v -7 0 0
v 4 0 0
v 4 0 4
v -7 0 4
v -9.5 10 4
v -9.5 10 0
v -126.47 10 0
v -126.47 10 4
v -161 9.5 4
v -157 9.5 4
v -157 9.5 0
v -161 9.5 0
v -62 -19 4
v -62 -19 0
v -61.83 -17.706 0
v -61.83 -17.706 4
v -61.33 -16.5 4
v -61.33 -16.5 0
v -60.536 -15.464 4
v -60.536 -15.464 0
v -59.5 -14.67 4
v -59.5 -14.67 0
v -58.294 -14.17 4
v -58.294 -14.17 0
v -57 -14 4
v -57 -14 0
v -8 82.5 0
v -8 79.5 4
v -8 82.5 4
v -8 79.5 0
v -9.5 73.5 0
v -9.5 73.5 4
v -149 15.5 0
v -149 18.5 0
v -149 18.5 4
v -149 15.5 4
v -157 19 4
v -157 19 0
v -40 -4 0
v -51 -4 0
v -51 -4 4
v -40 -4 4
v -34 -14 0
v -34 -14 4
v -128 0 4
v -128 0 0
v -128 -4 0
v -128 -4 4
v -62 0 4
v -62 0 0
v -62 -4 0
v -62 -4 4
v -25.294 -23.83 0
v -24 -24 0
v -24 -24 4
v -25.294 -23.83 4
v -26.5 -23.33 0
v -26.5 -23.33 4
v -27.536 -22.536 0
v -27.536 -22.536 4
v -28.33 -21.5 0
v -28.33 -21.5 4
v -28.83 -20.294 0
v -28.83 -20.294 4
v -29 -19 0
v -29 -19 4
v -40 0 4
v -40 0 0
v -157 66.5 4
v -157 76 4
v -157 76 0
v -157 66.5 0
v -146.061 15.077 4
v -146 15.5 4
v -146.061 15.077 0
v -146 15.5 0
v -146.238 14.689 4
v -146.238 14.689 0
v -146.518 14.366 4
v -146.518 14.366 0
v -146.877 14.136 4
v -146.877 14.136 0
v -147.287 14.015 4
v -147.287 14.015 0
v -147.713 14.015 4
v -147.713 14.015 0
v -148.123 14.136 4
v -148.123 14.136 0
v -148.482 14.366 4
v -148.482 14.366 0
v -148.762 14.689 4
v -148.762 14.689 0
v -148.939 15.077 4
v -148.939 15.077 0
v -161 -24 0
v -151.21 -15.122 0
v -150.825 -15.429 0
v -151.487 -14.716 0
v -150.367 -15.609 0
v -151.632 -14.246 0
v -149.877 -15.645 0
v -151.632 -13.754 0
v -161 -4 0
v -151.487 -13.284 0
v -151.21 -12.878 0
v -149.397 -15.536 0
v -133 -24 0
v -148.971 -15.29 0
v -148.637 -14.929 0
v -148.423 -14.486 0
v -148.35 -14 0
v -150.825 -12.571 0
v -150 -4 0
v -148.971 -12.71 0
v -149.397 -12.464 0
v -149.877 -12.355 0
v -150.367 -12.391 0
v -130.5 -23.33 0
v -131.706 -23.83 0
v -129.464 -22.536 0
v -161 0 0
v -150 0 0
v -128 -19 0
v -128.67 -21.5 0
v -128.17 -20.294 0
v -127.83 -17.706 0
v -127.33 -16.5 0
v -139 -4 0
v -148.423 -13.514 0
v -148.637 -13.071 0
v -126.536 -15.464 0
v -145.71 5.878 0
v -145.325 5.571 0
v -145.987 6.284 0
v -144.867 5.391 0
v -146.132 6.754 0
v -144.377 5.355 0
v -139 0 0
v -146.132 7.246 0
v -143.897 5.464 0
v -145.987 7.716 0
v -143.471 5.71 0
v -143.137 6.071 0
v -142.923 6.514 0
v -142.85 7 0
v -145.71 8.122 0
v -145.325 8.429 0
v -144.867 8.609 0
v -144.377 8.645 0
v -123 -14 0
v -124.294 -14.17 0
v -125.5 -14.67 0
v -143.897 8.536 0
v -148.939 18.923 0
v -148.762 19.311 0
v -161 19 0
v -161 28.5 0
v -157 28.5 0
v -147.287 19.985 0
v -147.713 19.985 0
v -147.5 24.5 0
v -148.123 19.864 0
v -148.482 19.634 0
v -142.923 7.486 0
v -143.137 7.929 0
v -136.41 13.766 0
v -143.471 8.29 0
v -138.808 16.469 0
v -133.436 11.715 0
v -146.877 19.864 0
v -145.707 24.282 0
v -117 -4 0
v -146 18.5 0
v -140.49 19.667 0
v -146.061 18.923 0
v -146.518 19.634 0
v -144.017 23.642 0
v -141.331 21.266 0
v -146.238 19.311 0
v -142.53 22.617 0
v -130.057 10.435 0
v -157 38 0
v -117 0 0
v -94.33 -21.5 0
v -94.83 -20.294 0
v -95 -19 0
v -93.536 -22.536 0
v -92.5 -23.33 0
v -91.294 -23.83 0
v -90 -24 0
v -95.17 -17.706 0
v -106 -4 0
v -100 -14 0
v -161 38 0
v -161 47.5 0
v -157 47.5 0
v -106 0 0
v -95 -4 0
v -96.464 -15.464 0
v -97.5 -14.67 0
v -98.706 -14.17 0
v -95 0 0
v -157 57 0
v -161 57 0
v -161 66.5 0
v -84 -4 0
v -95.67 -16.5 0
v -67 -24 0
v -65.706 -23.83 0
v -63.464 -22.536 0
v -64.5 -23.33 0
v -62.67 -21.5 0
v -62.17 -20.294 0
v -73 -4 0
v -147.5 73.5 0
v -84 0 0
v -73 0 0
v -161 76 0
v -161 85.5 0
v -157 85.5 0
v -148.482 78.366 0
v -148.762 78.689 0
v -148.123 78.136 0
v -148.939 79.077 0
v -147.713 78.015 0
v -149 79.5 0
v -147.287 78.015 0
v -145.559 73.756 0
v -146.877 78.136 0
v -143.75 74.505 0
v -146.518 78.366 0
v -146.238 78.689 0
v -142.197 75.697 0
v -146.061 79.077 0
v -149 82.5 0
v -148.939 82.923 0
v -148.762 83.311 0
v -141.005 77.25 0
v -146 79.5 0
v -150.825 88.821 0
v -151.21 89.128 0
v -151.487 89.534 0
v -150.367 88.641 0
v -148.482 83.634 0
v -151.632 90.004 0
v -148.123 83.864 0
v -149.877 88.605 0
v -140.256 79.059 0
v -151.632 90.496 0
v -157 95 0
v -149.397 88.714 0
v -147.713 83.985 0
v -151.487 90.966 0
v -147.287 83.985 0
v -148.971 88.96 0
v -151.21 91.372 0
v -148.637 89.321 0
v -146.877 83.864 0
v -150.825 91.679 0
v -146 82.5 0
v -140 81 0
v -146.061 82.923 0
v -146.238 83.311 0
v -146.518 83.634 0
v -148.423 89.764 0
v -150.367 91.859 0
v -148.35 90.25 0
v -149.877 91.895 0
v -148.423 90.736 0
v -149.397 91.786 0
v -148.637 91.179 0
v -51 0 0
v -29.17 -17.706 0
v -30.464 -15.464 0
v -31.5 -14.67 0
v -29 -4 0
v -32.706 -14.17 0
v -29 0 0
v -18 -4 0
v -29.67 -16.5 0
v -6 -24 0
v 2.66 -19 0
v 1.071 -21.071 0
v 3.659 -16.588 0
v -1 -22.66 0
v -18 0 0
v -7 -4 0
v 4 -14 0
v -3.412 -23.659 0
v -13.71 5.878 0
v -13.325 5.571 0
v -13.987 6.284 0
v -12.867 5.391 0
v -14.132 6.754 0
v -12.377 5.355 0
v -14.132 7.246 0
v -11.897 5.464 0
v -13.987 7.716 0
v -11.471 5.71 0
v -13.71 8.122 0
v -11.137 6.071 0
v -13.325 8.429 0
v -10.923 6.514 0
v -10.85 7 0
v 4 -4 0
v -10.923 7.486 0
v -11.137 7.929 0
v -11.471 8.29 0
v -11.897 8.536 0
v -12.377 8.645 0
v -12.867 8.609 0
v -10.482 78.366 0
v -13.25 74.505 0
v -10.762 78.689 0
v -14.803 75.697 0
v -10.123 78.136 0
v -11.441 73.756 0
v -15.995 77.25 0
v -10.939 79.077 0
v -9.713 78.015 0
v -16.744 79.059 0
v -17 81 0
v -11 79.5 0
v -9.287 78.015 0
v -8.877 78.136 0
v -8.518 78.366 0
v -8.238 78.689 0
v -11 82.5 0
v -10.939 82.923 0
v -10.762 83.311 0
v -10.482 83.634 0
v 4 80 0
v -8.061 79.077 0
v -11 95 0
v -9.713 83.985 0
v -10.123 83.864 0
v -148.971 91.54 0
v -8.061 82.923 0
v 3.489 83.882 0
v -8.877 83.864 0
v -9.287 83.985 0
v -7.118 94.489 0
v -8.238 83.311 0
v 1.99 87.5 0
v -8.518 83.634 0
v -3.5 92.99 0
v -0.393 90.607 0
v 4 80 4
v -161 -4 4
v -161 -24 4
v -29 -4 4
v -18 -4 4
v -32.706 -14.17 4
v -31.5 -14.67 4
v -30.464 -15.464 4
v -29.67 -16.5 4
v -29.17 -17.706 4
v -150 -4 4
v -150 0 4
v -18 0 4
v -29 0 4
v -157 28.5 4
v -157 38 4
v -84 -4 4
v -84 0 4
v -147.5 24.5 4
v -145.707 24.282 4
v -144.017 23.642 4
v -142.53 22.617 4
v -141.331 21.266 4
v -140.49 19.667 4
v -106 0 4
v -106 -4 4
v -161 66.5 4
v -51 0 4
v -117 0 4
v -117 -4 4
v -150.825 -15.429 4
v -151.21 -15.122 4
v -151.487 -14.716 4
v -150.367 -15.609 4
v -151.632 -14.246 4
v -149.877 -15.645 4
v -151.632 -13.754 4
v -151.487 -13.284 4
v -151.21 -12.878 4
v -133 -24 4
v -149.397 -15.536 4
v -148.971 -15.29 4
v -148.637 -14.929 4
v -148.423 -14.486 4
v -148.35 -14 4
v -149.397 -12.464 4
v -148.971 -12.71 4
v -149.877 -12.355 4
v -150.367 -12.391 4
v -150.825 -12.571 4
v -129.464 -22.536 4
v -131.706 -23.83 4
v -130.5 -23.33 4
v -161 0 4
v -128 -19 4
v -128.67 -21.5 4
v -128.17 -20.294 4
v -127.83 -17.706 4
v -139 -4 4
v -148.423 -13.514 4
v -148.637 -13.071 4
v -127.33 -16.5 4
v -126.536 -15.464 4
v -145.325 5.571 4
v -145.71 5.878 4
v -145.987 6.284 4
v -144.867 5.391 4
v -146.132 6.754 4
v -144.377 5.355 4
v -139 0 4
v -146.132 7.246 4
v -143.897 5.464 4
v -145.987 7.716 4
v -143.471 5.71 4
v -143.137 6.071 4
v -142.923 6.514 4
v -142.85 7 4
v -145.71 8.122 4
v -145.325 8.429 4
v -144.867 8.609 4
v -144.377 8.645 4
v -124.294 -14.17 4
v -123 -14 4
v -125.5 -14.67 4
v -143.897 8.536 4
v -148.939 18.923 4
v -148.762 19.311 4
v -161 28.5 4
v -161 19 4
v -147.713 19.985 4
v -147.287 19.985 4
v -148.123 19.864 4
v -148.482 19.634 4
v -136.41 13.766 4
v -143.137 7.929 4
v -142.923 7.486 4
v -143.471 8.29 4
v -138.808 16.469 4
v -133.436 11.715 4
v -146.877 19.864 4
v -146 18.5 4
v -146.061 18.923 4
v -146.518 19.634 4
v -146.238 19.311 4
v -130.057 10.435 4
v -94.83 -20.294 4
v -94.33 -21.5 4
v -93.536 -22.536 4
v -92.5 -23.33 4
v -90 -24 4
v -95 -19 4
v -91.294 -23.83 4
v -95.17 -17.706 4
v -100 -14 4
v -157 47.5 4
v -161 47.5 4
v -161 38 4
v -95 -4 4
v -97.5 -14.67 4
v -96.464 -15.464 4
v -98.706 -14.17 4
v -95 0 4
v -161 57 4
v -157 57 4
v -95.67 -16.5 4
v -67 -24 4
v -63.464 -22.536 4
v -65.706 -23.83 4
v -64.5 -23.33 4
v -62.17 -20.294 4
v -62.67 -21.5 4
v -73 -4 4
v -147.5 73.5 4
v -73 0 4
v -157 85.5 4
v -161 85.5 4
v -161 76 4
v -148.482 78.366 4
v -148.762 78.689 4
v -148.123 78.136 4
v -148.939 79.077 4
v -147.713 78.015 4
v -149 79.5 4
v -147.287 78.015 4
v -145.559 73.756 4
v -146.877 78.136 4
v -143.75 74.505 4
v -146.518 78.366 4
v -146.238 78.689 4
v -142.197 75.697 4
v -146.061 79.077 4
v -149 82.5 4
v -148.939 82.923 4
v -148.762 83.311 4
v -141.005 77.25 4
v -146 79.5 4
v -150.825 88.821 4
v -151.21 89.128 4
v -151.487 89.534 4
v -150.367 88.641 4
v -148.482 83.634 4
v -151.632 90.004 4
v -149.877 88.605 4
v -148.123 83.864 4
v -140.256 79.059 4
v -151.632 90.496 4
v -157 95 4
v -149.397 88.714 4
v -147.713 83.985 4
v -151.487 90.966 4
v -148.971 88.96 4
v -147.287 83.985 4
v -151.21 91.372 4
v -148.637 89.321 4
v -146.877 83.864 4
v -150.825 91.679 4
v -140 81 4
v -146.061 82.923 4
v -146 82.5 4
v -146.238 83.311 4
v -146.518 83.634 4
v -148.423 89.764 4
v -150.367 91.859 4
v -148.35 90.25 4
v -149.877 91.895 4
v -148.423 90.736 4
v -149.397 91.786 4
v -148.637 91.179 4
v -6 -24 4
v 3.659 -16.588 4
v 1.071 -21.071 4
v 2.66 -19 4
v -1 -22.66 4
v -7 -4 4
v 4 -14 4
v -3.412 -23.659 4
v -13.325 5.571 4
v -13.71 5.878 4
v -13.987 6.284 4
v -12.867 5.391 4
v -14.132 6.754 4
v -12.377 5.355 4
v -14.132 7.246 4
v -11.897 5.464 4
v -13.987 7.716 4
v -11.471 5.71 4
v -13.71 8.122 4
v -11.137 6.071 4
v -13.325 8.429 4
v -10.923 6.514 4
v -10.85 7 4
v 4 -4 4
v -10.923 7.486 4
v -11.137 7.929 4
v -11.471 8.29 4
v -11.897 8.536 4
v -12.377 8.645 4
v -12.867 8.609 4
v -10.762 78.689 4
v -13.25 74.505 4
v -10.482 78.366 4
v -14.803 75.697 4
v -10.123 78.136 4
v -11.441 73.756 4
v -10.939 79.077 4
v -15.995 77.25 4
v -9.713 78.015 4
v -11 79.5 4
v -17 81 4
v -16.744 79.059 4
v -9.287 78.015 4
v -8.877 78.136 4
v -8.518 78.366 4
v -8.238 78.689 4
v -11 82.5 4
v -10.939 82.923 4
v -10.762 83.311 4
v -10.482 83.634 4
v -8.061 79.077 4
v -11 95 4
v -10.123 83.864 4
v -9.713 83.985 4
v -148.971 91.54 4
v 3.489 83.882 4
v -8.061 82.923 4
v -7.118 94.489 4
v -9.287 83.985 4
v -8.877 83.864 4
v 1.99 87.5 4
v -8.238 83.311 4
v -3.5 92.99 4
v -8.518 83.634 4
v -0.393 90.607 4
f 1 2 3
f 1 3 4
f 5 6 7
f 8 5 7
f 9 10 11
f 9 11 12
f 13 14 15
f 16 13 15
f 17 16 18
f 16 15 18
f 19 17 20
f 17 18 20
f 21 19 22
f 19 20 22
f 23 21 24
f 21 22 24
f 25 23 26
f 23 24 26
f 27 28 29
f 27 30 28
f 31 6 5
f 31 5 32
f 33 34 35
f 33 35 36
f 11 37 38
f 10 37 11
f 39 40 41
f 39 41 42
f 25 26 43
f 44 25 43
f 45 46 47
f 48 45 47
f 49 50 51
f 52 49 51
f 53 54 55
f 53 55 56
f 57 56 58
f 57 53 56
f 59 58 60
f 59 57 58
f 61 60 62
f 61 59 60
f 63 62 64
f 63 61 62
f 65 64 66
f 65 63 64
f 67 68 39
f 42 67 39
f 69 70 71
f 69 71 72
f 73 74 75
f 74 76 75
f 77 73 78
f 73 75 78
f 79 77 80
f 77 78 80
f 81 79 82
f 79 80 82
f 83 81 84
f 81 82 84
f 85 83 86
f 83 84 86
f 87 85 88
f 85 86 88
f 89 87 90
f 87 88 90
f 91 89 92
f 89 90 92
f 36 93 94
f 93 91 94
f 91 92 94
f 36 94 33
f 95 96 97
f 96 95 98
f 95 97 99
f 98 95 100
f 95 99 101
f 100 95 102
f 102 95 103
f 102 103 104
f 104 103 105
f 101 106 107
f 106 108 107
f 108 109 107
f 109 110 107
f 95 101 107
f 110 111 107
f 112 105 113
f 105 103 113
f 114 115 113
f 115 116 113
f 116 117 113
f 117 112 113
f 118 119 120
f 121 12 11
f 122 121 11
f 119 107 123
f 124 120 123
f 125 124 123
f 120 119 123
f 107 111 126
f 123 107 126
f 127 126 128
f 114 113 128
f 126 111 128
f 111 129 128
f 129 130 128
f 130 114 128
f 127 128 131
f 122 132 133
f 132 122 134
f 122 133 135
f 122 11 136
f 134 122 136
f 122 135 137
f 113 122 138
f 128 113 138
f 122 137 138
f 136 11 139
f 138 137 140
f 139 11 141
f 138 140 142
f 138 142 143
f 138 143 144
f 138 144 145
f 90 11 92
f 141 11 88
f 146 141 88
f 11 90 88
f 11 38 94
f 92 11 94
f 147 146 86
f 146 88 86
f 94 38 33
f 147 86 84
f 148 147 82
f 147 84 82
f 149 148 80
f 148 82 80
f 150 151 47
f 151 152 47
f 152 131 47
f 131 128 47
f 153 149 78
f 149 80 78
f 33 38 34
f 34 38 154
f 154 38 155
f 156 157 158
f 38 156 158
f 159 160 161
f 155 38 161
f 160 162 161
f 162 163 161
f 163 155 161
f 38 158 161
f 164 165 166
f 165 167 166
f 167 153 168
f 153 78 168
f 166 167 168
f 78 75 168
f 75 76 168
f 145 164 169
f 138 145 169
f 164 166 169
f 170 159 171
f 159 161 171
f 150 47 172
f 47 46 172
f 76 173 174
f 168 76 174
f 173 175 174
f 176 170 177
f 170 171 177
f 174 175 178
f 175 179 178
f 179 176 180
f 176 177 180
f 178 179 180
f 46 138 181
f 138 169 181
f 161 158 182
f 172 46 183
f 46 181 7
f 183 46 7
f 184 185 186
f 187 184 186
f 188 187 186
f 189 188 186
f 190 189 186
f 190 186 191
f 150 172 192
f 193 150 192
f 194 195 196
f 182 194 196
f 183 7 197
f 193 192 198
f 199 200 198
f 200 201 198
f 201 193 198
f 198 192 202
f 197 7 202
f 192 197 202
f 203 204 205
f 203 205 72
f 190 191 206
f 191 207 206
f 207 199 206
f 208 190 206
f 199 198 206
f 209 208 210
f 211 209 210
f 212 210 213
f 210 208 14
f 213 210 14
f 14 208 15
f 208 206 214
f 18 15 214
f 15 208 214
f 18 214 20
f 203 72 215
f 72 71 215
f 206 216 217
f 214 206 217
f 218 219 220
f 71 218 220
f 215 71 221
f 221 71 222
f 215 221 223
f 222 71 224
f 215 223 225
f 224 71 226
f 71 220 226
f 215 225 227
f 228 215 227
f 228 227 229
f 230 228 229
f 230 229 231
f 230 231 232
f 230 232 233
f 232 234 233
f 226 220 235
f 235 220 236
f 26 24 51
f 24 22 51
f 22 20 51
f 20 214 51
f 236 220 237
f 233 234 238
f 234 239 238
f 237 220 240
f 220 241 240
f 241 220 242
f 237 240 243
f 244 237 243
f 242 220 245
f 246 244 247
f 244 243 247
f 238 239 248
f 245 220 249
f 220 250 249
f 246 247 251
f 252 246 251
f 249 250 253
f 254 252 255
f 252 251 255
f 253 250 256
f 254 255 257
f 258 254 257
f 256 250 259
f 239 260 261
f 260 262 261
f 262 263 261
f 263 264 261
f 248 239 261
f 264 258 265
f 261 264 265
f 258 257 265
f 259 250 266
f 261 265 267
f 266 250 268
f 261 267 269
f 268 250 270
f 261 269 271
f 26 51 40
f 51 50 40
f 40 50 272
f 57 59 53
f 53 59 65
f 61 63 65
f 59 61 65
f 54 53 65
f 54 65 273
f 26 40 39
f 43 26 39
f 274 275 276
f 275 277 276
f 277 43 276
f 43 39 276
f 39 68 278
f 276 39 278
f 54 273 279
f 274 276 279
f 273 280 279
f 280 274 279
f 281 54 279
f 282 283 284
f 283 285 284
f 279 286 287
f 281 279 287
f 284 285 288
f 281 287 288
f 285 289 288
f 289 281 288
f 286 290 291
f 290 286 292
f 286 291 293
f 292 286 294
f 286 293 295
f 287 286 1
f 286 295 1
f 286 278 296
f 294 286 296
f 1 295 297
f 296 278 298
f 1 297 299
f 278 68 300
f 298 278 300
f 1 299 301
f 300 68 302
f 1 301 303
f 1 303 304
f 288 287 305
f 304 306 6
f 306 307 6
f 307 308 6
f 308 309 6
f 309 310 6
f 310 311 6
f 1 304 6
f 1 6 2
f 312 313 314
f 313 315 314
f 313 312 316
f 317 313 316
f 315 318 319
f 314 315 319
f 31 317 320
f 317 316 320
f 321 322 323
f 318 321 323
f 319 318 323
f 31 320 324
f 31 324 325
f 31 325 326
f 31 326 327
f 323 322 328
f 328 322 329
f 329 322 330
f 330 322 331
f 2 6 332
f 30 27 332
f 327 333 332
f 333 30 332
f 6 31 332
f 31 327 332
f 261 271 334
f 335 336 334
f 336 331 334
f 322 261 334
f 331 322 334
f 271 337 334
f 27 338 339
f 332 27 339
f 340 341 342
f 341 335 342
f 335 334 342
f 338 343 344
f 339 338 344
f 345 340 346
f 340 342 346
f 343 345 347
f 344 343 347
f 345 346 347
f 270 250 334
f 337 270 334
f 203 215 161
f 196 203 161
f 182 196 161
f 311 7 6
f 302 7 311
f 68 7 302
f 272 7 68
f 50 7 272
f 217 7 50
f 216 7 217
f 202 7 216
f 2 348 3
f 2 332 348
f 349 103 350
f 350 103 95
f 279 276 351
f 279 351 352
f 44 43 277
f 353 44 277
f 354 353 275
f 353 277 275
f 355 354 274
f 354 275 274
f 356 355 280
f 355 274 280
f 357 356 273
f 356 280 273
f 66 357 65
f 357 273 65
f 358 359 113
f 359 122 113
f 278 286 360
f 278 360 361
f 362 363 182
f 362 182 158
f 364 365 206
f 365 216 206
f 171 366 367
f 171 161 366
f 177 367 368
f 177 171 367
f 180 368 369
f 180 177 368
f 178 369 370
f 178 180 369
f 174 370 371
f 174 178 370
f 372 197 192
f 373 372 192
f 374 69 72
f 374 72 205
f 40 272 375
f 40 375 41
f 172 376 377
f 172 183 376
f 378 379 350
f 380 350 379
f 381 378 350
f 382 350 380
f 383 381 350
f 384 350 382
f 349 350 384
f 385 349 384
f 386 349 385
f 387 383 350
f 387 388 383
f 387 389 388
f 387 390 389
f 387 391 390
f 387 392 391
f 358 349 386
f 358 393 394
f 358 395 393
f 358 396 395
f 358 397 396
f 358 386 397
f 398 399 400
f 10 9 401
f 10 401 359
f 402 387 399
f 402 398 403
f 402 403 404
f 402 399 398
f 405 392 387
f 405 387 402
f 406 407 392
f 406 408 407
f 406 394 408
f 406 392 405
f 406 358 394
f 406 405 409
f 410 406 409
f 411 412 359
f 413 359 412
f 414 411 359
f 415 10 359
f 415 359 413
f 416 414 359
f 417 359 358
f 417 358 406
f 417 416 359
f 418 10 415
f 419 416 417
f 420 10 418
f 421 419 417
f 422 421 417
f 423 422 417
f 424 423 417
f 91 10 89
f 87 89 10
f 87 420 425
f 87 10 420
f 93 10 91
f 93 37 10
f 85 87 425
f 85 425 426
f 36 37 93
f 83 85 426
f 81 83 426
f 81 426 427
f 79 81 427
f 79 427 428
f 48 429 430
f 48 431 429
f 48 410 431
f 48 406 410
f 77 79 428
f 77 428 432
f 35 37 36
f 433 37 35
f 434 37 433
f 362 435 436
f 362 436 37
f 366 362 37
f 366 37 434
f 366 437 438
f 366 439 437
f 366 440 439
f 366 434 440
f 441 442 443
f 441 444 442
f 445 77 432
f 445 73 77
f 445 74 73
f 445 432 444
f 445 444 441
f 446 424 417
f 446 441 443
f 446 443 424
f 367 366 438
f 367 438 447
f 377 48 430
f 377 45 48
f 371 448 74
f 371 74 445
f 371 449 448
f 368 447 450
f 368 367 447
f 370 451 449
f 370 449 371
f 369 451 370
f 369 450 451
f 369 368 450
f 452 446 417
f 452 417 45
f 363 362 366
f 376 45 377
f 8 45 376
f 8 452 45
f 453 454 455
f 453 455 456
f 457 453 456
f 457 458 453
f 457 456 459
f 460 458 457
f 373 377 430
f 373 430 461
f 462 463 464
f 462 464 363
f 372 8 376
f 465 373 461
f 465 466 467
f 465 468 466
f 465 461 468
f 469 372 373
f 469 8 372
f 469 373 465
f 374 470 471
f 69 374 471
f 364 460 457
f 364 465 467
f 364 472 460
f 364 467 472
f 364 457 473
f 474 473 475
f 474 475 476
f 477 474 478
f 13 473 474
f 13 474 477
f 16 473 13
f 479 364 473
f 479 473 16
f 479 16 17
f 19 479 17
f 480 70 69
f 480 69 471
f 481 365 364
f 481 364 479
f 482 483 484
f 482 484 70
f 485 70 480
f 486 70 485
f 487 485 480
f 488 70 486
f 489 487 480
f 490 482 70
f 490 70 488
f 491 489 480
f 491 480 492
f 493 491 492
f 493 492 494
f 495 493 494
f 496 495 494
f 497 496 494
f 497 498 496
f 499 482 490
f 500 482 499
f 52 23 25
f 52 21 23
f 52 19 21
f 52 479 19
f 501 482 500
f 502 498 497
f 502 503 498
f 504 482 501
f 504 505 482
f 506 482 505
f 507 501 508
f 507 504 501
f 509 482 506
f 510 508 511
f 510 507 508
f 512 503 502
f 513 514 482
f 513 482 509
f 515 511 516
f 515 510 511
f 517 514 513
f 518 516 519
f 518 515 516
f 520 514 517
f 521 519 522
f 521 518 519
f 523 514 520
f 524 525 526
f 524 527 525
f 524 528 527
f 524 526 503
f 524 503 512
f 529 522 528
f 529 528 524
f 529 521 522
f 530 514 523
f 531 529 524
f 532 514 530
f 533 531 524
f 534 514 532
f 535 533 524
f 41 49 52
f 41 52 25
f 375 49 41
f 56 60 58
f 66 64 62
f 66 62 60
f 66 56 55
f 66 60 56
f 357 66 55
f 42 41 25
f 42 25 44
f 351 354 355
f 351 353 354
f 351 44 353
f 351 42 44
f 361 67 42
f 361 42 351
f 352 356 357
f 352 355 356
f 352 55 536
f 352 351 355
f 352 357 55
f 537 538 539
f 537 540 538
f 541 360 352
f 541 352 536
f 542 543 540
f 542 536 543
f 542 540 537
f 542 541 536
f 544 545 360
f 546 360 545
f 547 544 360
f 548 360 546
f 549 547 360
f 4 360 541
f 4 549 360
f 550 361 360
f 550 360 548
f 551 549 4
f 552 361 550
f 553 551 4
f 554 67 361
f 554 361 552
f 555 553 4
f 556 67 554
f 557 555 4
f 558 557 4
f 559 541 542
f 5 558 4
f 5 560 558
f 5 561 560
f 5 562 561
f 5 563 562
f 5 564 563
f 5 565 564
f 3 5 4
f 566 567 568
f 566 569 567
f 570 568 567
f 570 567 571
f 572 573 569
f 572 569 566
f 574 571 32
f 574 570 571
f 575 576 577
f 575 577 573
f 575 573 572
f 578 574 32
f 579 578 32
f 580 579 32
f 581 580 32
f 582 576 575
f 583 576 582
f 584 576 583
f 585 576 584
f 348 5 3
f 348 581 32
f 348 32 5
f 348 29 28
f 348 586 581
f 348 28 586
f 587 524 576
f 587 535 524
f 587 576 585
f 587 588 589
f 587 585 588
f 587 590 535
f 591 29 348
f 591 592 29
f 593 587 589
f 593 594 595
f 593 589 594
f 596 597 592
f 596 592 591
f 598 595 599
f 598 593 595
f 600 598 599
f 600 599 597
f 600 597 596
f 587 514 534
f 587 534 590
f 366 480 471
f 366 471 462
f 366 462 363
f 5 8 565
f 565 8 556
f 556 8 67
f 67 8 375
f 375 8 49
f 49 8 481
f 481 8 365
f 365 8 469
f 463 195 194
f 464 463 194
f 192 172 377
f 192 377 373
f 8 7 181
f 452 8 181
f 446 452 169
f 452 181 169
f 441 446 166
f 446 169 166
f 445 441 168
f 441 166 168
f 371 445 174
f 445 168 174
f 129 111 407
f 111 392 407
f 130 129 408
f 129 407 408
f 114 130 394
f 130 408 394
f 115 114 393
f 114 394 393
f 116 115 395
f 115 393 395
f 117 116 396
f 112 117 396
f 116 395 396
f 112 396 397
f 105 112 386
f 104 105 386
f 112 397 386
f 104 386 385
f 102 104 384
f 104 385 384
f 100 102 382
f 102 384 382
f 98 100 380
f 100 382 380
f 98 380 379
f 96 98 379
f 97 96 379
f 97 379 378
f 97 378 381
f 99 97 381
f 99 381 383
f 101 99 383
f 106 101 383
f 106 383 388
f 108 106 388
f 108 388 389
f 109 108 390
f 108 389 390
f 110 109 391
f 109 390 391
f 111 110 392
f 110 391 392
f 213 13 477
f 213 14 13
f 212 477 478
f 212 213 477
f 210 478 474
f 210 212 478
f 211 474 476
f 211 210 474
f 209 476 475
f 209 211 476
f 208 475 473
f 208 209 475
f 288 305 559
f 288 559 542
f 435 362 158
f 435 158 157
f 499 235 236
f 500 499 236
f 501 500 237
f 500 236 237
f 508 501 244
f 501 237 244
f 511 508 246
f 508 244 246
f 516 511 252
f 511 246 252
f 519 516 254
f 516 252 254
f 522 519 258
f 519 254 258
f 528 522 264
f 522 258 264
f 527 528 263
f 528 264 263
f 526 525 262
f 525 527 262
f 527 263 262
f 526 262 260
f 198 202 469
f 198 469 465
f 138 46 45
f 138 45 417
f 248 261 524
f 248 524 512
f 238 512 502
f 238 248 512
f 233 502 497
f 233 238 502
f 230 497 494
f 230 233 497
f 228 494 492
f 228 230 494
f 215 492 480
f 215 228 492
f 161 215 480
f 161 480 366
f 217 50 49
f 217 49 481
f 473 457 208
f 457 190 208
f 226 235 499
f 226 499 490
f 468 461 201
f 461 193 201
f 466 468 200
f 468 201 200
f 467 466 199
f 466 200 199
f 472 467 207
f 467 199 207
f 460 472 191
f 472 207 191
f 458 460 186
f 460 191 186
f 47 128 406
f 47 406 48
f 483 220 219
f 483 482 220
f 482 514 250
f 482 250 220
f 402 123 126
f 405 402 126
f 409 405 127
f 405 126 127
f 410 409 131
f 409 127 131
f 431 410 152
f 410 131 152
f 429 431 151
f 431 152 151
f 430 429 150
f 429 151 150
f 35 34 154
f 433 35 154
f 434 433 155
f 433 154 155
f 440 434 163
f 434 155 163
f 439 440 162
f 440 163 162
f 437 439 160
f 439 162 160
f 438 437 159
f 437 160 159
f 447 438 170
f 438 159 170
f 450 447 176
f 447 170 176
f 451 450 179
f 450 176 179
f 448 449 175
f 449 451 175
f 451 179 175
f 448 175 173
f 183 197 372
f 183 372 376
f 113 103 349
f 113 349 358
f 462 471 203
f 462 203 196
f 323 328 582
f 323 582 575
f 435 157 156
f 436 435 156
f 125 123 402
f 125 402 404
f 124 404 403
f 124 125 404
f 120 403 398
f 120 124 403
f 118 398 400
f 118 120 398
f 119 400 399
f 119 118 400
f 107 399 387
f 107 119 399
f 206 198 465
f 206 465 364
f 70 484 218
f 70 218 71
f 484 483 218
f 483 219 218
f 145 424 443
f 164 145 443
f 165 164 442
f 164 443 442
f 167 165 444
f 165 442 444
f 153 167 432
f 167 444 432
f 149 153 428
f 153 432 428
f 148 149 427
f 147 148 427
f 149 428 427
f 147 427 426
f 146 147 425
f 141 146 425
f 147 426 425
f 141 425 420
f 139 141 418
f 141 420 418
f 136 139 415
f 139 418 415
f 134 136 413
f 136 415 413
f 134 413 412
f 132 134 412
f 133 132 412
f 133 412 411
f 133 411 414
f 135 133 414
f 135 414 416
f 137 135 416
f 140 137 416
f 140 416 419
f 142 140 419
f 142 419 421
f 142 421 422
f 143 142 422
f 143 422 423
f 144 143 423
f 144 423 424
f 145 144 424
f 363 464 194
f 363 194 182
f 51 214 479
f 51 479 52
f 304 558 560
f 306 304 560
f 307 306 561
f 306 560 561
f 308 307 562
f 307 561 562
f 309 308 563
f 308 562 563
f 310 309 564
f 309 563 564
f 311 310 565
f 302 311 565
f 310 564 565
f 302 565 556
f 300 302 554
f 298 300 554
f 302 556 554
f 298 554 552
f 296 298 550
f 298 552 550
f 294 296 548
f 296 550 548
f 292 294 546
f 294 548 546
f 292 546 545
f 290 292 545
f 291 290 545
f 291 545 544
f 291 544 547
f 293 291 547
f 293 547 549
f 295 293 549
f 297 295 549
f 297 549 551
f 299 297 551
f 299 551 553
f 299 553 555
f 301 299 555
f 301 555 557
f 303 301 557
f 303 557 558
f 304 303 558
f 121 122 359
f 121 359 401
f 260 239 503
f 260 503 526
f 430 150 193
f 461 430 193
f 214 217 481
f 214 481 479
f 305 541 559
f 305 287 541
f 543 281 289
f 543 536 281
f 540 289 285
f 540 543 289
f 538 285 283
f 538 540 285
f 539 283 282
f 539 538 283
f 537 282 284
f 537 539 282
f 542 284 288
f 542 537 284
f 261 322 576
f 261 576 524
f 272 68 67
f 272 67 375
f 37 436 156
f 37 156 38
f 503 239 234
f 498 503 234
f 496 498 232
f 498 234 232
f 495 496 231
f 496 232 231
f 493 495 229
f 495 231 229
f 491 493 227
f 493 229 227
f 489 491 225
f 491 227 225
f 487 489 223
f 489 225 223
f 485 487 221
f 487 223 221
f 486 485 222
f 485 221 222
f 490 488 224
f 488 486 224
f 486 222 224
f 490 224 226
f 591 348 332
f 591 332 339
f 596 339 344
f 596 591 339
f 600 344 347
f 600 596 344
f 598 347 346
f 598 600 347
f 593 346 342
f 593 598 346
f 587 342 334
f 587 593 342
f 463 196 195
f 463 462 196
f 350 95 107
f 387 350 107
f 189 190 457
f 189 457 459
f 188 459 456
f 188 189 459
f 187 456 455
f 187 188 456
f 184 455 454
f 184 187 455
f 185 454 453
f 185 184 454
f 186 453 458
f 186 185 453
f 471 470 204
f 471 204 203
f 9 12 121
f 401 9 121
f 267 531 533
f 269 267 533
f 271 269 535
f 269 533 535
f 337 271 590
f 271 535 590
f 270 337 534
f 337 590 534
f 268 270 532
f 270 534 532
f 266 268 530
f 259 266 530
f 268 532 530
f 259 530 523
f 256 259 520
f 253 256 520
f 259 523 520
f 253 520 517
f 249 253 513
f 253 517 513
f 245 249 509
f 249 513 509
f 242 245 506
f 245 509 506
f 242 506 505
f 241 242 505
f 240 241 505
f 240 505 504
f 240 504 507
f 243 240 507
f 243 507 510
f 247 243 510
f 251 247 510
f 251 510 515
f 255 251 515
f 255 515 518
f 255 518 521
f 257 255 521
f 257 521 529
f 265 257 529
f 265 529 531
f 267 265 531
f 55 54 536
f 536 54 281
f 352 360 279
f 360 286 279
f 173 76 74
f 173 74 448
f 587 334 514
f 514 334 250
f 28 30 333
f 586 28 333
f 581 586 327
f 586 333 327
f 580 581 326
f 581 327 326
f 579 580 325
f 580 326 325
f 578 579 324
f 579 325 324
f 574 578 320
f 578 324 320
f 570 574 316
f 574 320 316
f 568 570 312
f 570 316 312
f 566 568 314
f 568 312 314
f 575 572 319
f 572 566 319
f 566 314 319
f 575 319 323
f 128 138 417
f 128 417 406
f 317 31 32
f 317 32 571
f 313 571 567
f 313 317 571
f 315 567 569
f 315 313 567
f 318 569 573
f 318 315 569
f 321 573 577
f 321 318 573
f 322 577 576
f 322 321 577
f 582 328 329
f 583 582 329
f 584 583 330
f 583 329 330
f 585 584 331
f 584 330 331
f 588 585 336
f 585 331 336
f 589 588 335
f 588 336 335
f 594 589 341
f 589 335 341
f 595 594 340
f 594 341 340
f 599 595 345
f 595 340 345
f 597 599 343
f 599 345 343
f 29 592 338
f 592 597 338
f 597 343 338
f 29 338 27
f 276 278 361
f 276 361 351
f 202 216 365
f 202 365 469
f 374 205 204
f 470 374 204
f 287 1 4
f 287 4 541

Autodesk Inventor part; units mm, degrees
ref_plane "YZ Plane" through (0, 0, 0) normal (1, 0, 0) x (0, 1, 0)
ref_plane "XZ Plane" through (0, 0, 0) normal (0, 1, 0) x (-1, 0, 0)
ref_plane "XY Plane" through (0, 0, 0) normal (0, 0, 1) x (1, 0, 0)
sketch "Schizzo1" plane through (0, 0, 0) normal (0, 0, 1) x (1, 0, 0)
  line L0 (-152.5, 86) -> (-2.5, 86) construction
  line L1 (-152.5, 0) -> (-152.5, 86) construction
  line L2 (-2.5, 0) -> (-2.5, 86) construction
  circle A0 centre (-9.5, 81) radius 1.5 projected
  circle A1 centre (-147.5, 81) radius 1.5 projected
  circle A2 centre (-147.5, 17) radius 1.5 projected
  line L3 (4, 95) -> (-161, 95)
  line L4 (-161, -24) -> (-133, -24)
  line L5 (-128, -19) -> (-128, -19)
  line L6 (-123, -14) -> (-100, -14)
  line L7 (-95, -19) -> (-95, -19)
  line L8 (-90, -24) -> (-67, -24)
  line L9 (-62, -19) -> (-62, -19)
  line L10 (-57, -14) -> (-34, -14)
  line L11 (-29, -19) -> (-29, -19)
  line L12 (-24, -24) -> (4, -24)
  arc A3 (-133, -24) -> (-128, -19) centre (-133, -19) ccw
  arc A4 (-123, -14) -> (-128, -19) centre (-123, -19) ccw
  arc A5 (-95, -19) -> (-100, -14) centre (-100, -19) ccw
  arc A6 (-95, -19) -> (-90, -24) centre (-90, -19) ccw
  arc A7 (-67, -24) -> (-62, -19) centre (-67, -19) ccw
  arc A8 (-57, -14) -> (-62, -19) centre (-57, -19) ccw
  arc A9 (-29, -19) -> (-34, -14) centre (-34, -19) ccw
  arc A10 (-29, -19) -> (-24, -24) centre (-24, -19) ccw
  arc A11 (-17, 81) -> (-9.5, 73.5) centre (-9.5, 81) ccw
  arc A12 (-147.5, 73.5) -> (-140, 81) centre (-147.5, 81) ccw
  arc A13 (-140.4901, 19.6667) -> (-147.5, 24.5) centre (-147.5, 17) ccw
  line L13 (-147.5, 73.5) -> (-147.5, 24.5)
  line L14 (-17, 81) -> (-140, 81)
  line L15 (-9.5, 10) -> (-126.4703, 10)
  arc A14 (-140.4901, 19.6667) -> (-126.4703, 10) centre (-126.4703, 25) ccw
  line L16 (-9.5, 10) -> (-9.5, 73.5)
  line L17 (-161, 95) -> (-161, -24)
  line L18 (4, 95) -> (4, -24)
  line L19 (-161, -4) -> (-150, -4) projected
  line L20 (-150, 0) -> (-150, -4) projected
  line L21 (-150, 0) -> (-161, 0) projected
  line L22 (-161, 0) -> (-161, -4) projected
  line L23 (-139, -4) -> (-128, -4) projected
  line L24 (-128, 0) -> (-128, -4) projected
  line L25 (-128, 0) -> (-139, 0) projected
  line L26 (-139, 0) -> (-139, -4) projected
  line L27 (-117, -4) -> (-106, -4) projected
  line L28 (-106, 0) -> (-106, -4) projected
  line L29 (-106, 0) -> (-117, 0) projected
  line L30 (-117, 0) -> (-117, -4) projected
  line L31 (-95, -4) -> (-84, -4) projected
  line L32 (-84, 0) -> (-84, -4) projected
  line L33 (-84, 0) -> (-95, 0) projected
  line L34 (-95, 0) -> (-95, -4) projected
  line L35 (-73, -4) -> (-62, -4) projected
  line L36 (-62, 0) -> (-62, -4) projected
  line L37 (-62, 0) -> (-73, 0) projected
  line L38 (-73, 0) -> (-73, -4) projected
  line L39 (-51, -4) -> (-40, -4) projected
  line L40 (-40, 0) -> (-40, -4) projected
  line L41 (-40, 0) -> (-51, 0) projected
  line L42 (-51, 0) -> (-51, -4) projected
  line L43 (-29, -4) -> (-18, -4) projected
  line L44 (-18, 0) -> (-18, -4) projected
  line L45 (-18, 0) -> (-29, 0) projected
  line L46 (-29, 0) -> (-29, -4) projected
  line L47 (-7, -4) -> (4, -4) projected
  line L48 (-7, 0) -> (-7, -4) projected
  line L49 (-147.5, 82.5) -> (-147.5, 79.5) construction
  line L50 (-149, 82.5) -> (-149, 79.5)
  line L51 (-146, 79.5) -> (-146, 82.5)
  arc A15 (-146, 82.5) -> (-149, 82.5) centre (-147.5, 82.5) ccw
  arc A16 (-149, 79.5) -> (-146, 79.5) centre (-147.5, 79.5) ccw
  line L52 (-9.5, 82.5) -> (-9.5, 79.5) construction
  line L53 (-11, 82.5) -> (-11, 79.5)
  line L54 (-8, 79.5) -> (-8, 82.5)
  arc A17 (-8, 82.5) -> (-11, 82.5) centre (-9.5, 82.5) ccw
  arc A18 (-11, 79.5) -> (-8, 79.5) centre (-9.5, 79.5) ccw
  line L55 (-147.5, 18.5) -> (-147.5, 15.5) construction
  line L56 (-149, 18.5) -> (-149, 15.5)
  line L57 (-146, 15.5) -> (-146, 18.5)
  arc A19 (-146, 18.5) -> (-149, 18.5) centre (-147.5, 18.5) ccw
  arc A20 (-149, 15.5) -> (-146, 15.5) centre (-147.5, 15.5) ccw
  line L58 (4, 0) -> (4, -4) projected
  line L59 (4, 0) -> (-7, 0) projected
  point P0 (-128, -24)
  point P1 (-128, -14)
  point P2 (-95, -14)
  point P3 (-95, -24)
  point P4 (-62, -24)
  point P5 (-62, -14)
  point P6 (-29, -14)
  point P7 (-29, -24)
  point P8 (-144.8074, 10)
  dimension "d0" = 165
  dimension "d9" = 33
  dimension "d10" = 10
  dimension "d11" = 33
  dimension "d12" = 10
  dimension "d13" = 33
  dimension "d14" = 10
  dimension "d15" = 33
  dimension "d16" = 5
  dimension "d21" = 15
extrude "Estrusione1" add sketch "Schizzo1" along normal blind 4 contours L18 L59 L48 L47 L12 A10 A9 L10 A8 A7 L8 A6 A5 L6 A4 A3 L4 L17 L19 L20 L21 L3
sketch "Schizzo2" plane through (0, 0, 4) normal (0, 0, 1) x (1, 0, 0)
  line L0 (-157, 85.5) -> (-161, 85.5)
  line L1 (-161, 85.5) -> (-161, 95)
  line L2 (-161, 95) -> (-157, 95)
  line L3 (-157, 95) -> (-157, 85.5)
  line L4 (-157, 66.5) -> (-161, 66.5)
  line L5 (-161, 66.5) -> (-161, 76)
  line L6 (-161, 76) -> (-157, 76)
  line L7 (-157, 76) -> (-157, 66.5)
  line L8 (-161, 57) -> (-157, 57)
  line L9 (-157, 57) -> (-157, 47.5)
  line L10 (-157, 47.5) -> (-161, 47.5)
  line L11 (-161, 47.5) -> (-161, 57)
  line L12 (-157, 28.5) -> (-161, 28.5)
  line L13 (-161, 28.5) -> (-161, 38)
  line L14 (-161, 38) -> (-157, 38)
  line L15 (-157, 38) -> (-157, 28.5)
  line L16 (-161, 19) -> (-157, 19)
  line L17 (-157, 19) -> (-157, 9.5)
  line L18 (-157, 9.5) -> (-161, 9.5)
  line L19 (-161, 9.5) -> (-161, 19)
  point P0 (0, 0)
extrude "Estrusione2" cut sketch "Schizzo2" against normal blind 4
fillet "Raccordo1" radius 15 1 edges at (4, 95, 2)
fillet "Raccordo2" radius 10 1 edges at (4, -24, 2)
sketch "Schizzo3" plane through (0, 0, 4) normal (0, 0, 1) x (1, 0, 0)
  line L0 (-14.15, 0) -> (-10.85, 0) projected
  line L1 (-146.15, 0) -> (-142.85, 0) projected
  line L2 (-144.5, 0) -> (-144.5, 7) construction
  line L3 (-144.5, 0) -> (-137.5, 0) construction
  line L4 (-12.5, 0) -> (-12.5, 7) construction
  circle A0 centre (-144.5, 7) radius 1.65
  circle A1 centre (-12.5, 7) radius 1.65
  line L5 (-157, 82.4) -> (-157, 79.1) construction
  line L6 (-157, 85.5) -> (-157, 95) construction
  line L7 (-157, 95) -> (-157, 85.5) projected
  line L8 (-157, 90.25) -> (-150, 90.25) construction
  circle A2 centre (-150, 90.25) radius 1.65
  line L9 (-157, -12.35) -> (-157, -15.65) construction
  line L10 (-157, -14) -> (-150, -14) construction
  circle A3 centre (-150, -14) radius 1.65
  point P0 (0, 0)
  dimension "d28" = 7
  dimension "d29" = 90
  dimension "d30" = 7
  dimension "d31" = 3.3
  dimension "d32" = 3.3
  dimension "d35" = 7
  dimension "d36" = 3.3
  dimension "d37" = 7
  dimension "d38" = 3.3
extrude "Estrusione3" cut sketch "Schizzo3" against normal blind 4
properties part number "LatoAlimentatore"
